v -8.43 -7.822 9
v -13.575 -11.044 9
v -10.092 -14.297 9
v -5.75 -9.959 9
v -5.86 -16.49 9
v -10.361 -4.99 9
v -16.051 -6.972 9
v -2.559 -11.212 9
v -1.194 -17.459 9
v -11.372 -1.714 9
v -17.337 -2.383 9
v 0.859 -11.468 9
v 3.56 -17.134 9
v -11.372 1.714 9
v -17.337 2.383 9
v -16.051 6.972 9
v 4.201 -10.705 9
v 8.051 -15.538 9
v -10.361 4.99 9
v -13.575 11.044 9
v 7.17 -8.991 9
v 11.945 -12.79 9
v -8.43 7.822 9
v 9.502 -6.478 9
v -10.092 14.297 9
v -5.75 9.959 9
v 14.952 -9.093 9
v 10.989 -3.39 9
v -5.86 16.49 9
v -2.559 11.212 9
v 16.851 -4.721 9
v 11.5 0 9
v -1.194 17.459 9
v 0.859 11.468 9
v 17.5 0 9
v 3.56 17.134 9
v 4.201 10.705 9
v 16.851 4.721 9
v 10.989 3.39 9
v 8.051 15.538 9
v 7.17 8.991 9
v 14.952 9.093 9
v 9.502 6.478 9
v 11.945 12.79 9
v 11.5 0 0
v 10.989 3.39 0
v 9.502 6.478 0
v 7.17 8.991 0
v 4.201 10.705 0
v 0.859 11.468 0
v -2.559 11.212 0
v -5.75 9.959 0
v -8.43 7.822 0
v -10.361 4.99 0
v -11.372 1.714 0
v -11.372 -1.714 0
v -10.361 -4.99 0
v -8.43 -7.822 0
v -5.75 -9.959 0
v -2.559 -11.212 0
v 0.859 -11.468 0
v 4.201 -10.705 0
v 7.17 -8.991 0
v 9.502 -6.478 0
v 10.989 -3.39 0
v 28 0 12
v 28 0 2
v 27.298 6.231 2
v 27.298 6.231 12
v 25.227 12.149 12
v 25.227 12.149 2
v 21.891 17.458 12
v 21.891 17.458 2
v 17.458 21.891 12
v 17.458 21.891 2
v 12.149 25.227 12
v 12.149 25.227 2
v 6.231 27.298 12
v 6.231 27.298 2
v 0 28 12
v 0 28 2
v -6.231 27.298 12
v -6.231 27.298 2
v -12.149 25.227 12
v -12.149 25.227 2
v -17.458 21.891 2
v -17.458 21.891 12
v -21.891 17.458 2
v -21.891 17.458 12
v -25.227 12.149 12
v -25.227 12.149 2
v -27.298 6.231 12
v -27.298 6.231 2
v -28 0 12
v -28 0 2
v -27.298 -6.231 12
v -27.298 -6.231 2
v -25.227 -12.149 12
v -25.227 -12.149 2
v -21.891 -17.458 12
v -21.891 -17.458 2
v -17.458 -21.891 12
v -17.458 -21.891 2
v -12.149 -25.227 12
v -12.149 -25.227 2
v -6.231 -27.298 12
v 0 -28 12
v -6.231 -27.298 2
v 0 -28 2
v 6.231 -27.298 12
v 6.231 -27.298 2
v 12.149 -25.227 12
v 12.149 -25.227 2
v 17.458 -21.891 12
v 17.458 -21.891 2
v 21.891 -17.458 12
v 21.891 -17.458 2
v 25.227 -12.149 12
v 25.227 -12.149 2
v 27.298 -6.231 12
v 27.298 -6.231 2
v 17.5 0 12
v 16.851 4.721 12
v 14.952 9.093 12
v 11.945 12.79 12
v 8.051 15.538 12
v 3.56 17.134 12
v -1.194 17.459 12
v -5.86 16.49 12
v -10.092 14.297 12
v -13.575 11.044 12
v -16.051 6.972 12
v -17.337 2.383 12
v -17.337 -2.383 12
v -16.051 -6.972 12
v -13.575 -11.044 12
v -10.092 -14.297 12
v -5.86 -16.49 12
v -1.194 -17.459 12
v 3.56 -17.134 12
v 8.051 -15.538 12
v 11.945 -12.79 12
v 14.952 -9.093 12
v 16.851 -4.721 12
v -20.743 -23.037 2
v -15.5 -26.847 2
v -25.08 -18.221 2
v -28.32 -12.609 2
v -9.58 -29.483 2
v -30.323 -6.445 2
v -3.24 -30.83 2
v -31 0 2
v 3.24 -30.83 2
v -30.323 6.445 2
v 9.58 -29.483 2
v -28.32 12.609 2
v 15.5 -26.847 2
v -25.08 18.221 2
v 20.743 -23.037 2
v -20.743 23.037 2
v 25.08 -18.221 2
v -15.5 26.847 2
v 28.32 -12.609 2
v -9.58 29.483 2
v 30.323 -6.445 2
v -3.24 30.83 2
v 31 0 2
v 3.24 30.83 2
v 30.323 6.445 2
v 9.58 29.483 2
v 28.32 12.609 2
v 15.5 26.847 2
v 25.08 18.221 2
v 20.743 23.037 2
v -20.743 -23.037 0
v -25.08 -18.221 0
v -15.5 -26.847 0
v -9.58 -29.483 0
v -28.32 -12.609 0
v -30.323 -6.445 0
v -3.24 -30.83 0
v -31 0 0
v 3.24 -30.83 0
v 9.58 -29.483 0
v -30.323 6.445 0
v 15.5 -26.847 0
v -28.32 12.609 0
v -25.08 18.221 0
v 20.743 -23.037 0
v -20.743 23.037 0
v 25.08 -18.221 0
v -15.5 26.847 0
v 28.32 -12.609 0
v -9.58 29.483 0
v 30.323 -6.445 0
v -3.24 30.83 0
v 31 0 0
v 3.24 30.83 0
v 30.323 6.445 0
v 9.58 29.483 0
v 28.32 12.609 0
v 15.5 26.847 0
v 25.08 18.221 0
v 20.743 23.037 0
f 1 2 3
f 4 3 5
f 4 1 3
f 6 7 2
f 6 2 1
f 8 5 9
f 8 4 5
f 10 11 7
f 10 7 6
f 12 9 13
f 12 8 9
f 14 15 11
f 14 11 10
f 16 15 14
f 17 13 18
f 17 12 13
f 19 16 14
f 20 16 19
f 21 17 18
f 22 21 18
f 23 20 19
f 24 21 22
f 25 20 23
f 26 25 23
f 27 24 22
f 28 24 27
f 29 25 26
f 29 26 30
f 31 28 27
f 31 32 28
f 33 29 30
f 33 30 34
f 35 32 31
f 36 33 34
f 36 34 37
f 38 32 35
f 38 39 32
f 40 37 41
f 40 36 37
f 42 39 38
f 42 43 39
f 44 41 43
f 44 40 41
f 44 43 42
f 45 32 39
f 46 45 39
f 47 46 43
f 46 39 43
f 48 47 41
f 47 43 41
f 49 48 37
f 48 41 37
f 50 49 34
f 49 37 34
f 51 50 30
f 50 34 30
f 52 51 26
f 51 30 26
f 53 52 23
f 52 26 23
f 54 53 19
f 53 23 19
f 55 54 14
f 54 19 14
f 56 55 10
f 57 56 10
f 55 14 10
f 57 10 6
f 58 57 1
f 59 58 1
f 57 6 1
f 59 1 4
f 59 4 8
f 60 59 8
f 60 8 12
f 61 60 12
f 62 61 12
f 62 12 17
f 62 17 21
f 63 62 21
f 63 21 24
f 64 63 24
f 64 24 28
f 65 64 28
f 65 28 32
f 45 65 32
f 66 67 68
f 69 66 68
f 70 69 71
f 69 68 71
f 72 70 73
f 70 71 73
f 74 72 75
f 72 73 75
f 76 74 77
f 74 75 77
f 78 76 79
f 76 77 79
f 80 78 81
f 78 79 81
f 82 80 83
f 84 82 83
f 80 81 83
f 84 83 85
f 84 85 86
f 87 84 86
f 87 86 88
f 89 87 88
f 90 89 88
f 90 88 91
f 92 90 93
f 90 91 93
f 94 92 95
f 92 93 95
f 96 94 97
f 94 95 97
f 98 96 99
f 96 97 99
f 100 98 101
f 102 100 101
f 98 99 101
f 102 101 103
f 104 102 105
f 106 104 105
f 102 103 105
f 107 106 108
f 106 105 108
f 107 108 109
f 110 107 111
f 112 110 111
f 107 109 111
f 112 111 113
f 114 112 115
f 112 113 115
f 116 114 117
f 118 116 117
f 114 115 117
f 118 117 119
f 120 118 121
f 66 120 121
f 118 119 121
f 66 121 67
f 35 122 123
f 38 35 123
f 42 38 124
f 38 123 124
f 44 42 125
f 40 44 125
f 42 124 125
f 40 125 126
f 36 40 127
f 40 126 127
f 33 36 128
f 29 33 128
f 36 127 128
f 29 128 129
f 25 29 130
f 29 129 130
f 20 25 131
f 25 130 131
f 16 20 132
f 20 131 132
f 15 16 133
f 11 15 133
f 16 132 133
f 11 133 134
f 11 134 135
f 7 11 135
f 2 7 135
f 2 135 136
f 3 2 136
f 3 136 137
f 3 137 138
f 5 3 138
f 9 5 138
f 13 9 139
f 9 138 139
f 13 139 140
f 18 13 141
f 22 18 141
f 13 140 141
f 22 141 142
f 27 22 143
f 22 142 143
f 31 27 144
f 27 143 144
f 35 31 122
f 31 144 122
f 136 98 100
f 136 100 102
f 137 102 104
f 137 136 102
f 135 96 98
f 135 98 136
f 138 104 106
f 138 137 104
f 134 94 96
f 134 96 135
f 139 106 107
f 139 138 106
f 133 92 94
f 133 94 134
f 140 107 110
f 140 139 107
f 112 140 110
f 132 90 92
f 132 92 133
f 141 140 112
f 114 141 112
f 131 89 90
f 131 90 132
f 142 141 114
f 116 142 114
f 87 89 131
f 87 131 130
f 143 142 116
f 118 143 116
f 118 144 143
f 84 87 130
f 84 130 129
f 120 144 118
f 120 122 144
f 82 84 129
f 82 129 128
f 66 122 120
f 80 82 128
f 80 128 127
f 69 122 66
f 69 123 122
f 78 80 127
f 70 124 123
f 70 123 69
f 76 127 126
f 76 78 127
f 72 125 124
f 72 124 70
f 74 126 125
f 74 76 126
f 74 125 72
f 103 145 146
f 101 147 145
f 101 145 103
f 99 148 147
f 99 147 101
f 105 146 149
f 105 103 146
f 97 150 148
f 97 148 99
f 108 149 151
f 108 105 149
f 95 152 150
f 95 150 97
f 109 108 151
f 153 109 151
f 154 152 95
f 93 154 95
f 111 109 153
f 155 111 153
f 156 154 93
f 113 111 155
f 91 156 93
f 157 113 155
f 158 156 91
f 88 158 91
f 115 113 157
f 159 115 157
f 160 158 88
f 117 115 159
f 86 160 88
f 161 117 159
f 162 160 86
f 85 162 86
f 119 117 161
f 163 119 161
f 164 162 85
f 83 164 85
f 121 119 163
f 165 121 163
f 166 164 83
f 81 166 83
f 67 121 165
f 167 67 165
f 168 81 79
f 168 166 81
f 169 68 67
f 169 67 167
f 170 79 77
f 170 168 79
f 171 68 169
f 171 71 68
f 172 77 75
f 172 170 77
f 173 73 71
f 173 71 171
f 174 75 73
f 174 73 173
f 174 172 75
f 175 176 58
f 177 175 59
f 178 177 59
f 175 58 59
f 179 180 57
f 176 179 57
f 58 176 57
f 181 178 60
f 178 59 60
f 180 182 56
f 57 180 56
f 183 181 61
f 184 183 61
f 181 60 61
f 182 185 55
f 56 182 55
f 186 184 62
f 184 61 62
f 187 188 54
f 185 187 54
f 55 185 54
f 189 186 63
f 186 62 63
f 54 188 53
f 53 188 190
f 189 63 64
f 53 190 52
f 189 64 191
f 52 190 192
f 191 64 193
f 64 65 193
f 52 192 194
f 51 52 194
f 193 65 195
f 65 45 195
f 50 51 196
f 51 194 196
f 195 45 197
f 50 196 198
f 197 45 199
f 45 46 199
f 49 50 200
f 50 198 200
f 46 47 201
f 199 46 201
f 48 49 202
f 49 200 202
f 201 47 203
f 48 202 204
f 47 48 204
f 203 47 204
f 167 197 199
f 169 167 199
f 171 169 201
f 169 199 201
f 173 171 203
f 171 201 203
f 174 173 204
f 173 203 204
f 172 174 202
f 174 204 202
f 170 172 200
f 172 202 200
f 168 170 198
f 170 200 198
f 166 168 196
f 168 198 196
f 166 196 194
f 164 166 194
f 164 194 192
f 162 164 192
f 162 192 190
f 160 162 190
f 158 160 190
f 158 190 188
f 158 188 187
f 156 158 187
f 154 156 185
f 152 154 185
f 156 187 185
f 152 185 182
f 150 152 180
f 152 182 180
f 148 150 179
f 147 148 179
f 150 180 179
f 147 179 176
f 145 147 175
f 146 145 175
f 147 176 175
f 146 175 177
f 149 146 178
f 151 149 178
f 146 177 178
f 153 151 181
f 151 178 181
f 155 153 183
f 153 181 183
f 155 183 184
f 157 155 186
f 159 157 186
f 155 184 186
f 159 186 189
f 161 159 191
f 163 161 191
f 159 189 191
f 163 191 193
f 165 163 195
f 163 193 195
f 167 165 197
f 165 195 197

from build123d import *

# Parameters (mm, degrees)
CROQUIS1_R              = 31
SALIENTE_EXTRUIR1_DEPTH = 2
CROQUIS2_R              = 28
SALIENTE_EXTRUIR2_DEPTH = 10
CROQUIS3_R              = 11.5
CORTAR_EXTRUIR1_DEPTH   = 20
CROQUIS4_R              = 17.5
CORTAR_EXTRUIR2_DEPTH   = 3


with BuildPart() as part:
    # Croquis1 → Saliente-Extruir1 (new body)
    with BuildSketch(Plane.XY):
        Circle(CROQUIS1_R)
    extrude(amount=SALIENTE_EXTRUIR1_DEPTH)

    # Croquis2 → Saliente-Extruir2 (add)
    with BuildSketch(Plane.XY.offset(2)):
        Circle(CROQUIS2_R)
    extrude(amount=SALIENTE_EXTRUIR2_DEPTH)

    # Croquis3 → Cortar-Extruir1 (cut)
    with BuildSketch(Plane.XY.offset(12)):
        Circle(CROQUIS3_R)
    extrude(amount=-CORTAR_EXTRUIR1_DEPTH, mode=Mode.SUBTRACT)

    # Croquis4 → Cortar-Extruir2 (cut)
    with BuildSketch(Plane.XY.offset(12)):
        Circle(CROQUIS4_R)
    extrude(amount=-CORTAR_EXTRUIR2_DEPTH, mode=Mode.SUBTRACT)


solid = part.part
